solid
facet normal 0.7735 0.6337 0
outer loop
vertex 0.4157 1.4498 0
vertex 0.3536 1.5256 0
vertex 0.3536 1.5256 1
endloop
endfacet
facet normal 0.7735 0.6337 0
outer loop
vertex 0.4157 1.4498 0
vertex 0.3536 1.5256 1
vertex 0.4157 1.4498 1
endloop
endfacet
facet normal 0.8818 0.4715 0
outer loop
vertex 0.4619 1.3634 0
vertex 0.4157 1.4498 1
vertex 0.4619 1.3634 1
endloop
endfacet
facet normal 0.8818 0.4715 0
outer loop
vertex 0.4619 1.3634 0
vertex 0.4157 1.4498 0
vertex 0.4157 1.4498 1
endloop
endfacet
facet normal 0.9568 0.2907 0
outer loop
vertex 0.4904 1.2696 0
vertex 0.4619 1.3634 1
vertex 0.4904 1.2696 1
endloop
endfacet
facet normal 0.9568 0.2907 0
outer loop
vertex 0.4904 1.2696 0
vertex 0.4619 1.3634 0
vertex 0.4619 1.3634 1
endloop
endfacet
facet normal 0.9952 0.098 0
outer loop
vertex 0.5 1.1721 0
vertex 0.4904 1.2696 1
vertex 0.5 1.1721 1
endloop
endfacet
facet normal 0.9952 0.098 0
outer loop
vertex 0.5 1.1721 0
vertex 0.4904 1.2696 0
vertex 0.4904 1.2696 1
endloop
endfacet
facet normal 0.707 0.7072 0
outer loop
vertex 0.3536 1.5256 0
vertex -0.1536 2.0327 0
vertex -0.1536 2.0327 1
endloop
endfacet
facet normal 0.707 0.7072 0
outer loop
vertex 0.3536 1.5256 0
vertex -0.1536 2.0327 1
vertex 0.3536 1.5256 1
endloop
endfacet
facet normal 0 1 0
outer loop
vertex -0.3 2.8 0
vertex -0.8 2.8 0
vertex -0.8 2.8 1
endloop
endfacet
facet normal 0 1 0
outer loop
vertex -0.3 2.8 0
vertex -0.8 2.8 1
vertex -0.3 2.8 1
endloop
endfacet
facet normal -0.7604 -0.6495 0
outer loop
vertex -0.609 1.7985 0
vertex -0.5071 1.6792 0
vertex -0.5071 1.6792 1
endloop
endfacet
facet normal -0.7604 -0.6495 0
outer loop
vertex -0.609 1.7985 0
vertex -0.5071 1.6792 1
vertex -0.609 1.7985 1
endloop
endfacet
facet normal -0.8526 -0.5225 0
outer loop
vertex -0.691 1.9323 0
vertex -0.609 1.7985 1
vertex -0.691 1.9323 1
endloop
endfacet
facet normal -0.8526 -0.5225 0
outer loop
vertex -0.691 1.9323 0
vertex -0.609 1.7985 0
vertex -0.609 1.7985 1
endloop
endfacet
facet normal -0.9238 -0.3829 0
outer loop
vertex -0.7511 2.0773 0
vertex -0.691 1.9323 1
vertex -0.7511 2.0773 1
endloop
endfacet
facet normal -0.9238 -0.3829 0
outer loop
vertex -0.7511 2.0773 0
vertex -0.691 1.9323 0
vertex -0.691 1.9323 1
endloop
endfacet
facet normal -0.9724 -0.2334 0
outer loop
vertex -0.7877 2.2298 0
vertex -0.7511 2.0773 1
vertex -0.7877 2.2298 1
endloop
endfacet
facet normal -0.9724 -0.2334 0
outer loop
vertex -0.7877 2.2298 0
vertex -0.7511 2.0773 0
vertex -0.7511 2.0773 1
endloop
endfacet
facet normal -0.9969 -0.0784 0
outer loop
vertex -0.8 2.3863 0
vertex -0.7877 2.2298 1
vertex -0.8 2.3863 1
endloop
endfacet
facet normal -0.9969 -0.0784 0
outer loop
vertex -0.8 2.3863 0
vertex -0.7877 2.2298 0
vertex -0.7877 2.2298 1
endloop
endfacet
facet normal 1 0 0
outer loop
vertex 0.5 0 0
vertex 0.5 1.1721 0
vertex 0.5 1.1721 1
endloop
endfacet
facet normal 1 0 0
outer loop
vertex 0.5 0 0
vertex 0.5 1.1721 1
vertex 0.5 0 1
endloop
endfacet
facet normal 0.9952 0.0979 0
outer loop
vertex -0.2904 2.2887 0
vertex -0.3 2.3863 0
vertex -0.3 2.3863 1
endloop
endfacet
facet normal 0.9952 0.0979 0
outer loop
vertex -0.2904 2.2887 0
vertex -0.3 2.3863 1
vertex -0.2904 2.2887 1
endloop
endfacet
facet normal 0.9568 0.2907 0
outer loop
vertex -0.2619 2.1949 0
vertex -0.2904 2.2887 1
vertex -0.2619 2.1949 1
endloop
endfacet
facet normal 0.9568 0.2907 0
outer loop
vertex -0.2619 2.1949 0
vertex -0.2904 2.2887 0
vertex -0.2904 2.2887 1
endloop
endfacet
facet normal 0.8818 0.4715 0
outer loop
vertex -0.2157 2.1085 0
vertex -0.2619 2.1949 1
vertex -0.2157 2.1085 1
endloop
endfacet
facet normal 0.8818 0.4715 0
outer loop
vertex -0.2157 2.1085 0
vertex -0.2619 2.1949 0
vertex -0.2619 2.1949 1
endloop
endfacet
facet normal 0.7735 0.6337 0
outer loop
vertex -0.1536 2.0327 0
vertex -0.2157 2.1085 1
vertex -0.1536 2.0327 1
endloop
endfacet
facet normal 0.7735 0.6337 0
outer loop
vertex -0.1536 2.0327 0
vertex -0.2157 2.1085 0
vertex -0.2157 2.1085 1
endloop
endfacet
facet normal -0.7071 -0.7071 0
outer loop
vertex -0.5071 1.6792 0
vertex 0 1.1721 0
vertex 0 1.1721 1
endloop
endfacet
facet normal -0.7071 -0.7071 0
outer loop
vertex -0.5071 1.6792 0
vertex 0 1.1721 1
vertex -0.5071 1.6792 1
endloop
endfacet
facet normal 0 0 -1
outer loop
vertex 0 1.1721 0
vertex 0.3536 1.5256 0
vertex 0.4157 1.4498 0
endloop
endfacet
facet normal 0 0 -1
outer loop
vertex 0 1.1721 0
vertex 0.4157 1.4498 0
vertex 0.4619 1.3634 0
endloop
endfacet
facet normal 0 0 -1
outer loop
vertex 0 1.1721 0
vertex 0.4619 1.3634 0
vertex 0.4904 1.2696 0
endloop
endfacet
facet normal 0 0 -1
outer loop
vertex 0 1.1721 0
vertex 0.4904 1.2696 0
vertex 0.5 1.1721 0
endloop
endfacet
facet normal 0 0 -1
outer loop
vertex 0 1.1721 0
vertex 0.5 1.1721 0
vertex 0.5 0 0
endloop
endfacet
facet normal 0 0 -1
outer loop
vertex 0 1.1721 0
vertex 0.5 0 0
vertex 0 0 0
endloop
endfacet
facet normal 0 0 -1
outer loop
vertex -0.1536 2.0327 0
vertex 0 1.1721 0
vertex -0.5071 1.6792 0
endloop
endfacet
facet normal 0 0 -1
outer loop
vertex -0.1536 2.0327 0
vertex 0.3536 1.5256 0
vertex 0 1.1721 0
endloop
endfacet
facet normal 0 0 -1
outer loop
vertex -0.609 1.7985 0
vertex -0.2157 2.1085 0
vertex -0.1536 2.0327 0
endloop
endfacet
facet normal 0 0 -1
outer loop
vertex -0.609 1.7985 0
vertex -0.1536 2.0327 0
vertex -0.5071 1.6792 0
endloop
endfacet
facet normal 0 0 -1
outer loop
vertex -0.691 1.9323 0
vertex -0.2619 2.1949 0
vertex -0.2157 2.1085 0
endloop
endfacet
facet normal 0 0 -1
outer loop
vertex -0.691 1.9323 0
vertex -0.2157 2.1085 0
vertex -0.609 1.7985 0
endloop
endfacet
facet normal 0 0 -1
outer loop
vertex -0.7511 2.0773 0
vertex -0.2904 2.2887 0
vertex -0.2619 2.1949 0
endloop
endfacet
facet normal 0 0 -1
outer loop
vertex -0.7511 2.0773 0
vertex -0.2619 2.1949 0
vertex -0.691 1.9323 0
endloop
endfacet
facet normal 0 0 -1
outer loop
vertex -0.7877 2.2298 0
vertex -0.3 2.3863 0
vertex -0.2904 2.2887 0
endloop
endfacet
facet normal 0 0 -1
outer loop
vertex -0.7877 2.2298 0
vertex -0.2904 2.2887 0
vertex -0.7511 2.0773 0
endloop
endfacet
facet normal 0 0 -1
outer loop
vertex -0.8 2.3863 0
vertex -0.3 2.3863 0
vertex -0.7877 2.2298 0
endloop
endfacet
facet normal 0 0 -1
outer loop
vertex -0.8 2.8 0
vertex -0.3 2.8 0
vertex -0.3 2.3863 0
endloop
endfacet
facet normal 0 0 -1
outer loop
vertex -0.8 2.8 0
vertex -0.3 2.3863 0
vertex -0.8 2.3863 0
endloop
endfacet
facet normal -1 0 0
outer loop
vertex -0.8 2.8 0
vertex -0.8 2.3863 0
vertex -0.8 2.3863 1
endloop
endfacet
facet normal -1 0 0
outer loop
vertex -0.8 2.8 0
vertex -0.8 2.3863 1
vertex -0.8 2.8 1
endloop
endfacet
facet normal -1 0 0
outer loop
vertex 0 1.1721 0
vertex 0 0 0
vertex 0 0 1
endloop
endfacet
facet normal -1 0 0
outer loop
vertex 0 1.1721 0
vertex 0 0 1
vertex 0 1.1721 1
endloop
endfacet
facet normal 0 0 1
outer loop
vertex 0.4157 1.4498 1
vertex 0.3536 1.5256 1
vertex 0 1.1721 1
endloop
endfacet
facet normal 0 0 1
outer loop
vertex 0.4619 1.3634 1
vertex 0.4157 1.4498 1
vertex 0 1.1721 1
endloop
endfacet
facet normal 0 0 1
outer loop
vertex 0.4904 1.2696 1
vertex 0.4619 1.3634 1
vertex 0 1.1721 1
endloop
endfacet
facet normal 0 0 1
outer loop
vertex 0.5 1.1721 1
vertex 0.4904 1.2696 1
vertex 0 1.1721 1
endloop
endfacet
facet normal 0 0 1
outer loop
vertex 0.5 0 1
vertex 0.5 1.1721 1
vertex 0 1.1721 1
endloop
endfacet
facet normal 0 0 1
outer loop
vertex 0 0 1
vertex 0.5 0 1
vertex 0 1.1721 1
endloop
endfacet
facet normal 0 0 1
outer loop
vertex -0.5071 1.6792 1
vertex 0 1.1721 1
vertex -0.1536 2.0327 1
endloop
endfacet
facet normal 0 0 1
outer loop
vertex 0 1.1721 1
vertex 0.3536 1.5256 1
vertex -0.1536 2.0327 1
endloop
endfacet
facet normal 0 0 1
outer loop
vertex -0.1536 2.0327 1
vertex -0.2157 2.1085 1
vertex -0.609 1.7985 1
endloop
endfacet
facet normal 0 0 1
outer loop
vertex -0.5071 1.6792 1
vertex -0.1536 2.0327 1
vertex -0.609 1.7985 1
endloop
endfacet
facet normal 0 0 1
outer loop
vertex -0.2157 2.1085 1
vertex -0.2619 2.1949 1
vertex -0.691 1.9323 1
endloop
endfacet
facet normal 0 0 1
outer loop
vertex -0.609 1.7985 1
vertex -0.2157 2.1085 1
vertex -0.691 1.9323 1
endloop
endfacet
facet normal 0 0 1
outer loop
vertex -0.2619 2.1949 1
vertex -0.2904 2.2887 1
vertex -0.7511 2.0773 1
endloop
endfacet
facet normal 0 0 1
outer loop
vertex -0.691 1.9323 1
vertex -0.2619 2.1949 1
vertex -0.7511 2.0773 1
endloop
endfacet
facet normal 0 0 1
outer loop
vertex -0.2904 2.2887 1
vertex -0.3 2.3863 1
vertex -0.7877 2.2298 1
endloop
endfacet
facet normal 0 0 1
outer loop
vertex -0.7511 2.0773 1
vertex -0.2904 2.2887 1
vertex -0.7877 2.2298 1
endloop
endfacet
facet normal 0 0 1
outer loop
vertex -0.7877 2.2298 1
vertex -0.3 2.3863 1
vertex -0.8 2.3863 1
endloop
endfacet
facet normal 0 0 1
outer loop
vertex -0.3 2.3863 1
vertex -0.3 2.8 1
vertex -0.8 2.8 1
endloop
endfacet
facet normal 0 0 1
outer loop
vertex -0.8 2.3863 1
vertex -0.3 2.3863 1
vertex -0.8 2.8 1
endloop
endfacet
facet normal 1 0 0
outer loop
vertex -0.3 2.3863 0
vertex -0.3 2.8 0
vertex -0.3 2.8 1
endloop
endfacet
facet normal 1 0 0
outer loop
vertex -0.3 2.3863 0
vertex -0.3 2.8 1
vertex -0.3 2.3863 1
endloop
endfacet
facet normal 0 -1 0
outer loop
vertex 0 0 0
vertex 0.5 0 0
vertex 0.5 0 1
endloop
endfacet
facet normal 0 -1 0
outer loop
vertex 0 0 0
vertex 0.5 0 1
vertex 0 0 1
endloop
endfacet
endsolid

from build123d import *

# Parameters (mm, degrees)
BOSS_EXTRU_1_DEPTH = 1


with BuildPart() as part:
    # Esquisse1 → Boss.-Extru.1 (new body)
    with BuildSketch(Plane.XY):
        with BuildLine():
            Line((0, 0), (0, 1.172060256))
            Line((0, 1.172060256), (-0.507106781, 1.679167038))
            ThreePointArc((-0.507106781, 1.679167038), (-0.723879533, 2.003590386), (-0.8, 2.386273819))
            Line((-0.8, 2.386273819), (-0.8, 2.8))
            Line((-0.8, 2.8), (-0.3, 2.8))
            Line((-0.3, 2.8), (-0.3, 2.386273819))
            ThreePointArc((-0.3, 2.386273819), (-0.261939766, 2.194932103), (-0.153553391, 2.032720428))
            Line((-0.153553391, 2.032720428), (0.353553391, 1.525613647))
            ThreePointArc((0.353553391, 1.525613647), (0.461939766, 1.363401973), (0.5, 1.172060256))
            Line((0.5, 1.172060256), (0.5, 0))
            Line((0.5, 0), (0, 0))
        make_face()
    extrude(amount=BOSS_EXTRU_1_DEPTH)


solid = part.part
